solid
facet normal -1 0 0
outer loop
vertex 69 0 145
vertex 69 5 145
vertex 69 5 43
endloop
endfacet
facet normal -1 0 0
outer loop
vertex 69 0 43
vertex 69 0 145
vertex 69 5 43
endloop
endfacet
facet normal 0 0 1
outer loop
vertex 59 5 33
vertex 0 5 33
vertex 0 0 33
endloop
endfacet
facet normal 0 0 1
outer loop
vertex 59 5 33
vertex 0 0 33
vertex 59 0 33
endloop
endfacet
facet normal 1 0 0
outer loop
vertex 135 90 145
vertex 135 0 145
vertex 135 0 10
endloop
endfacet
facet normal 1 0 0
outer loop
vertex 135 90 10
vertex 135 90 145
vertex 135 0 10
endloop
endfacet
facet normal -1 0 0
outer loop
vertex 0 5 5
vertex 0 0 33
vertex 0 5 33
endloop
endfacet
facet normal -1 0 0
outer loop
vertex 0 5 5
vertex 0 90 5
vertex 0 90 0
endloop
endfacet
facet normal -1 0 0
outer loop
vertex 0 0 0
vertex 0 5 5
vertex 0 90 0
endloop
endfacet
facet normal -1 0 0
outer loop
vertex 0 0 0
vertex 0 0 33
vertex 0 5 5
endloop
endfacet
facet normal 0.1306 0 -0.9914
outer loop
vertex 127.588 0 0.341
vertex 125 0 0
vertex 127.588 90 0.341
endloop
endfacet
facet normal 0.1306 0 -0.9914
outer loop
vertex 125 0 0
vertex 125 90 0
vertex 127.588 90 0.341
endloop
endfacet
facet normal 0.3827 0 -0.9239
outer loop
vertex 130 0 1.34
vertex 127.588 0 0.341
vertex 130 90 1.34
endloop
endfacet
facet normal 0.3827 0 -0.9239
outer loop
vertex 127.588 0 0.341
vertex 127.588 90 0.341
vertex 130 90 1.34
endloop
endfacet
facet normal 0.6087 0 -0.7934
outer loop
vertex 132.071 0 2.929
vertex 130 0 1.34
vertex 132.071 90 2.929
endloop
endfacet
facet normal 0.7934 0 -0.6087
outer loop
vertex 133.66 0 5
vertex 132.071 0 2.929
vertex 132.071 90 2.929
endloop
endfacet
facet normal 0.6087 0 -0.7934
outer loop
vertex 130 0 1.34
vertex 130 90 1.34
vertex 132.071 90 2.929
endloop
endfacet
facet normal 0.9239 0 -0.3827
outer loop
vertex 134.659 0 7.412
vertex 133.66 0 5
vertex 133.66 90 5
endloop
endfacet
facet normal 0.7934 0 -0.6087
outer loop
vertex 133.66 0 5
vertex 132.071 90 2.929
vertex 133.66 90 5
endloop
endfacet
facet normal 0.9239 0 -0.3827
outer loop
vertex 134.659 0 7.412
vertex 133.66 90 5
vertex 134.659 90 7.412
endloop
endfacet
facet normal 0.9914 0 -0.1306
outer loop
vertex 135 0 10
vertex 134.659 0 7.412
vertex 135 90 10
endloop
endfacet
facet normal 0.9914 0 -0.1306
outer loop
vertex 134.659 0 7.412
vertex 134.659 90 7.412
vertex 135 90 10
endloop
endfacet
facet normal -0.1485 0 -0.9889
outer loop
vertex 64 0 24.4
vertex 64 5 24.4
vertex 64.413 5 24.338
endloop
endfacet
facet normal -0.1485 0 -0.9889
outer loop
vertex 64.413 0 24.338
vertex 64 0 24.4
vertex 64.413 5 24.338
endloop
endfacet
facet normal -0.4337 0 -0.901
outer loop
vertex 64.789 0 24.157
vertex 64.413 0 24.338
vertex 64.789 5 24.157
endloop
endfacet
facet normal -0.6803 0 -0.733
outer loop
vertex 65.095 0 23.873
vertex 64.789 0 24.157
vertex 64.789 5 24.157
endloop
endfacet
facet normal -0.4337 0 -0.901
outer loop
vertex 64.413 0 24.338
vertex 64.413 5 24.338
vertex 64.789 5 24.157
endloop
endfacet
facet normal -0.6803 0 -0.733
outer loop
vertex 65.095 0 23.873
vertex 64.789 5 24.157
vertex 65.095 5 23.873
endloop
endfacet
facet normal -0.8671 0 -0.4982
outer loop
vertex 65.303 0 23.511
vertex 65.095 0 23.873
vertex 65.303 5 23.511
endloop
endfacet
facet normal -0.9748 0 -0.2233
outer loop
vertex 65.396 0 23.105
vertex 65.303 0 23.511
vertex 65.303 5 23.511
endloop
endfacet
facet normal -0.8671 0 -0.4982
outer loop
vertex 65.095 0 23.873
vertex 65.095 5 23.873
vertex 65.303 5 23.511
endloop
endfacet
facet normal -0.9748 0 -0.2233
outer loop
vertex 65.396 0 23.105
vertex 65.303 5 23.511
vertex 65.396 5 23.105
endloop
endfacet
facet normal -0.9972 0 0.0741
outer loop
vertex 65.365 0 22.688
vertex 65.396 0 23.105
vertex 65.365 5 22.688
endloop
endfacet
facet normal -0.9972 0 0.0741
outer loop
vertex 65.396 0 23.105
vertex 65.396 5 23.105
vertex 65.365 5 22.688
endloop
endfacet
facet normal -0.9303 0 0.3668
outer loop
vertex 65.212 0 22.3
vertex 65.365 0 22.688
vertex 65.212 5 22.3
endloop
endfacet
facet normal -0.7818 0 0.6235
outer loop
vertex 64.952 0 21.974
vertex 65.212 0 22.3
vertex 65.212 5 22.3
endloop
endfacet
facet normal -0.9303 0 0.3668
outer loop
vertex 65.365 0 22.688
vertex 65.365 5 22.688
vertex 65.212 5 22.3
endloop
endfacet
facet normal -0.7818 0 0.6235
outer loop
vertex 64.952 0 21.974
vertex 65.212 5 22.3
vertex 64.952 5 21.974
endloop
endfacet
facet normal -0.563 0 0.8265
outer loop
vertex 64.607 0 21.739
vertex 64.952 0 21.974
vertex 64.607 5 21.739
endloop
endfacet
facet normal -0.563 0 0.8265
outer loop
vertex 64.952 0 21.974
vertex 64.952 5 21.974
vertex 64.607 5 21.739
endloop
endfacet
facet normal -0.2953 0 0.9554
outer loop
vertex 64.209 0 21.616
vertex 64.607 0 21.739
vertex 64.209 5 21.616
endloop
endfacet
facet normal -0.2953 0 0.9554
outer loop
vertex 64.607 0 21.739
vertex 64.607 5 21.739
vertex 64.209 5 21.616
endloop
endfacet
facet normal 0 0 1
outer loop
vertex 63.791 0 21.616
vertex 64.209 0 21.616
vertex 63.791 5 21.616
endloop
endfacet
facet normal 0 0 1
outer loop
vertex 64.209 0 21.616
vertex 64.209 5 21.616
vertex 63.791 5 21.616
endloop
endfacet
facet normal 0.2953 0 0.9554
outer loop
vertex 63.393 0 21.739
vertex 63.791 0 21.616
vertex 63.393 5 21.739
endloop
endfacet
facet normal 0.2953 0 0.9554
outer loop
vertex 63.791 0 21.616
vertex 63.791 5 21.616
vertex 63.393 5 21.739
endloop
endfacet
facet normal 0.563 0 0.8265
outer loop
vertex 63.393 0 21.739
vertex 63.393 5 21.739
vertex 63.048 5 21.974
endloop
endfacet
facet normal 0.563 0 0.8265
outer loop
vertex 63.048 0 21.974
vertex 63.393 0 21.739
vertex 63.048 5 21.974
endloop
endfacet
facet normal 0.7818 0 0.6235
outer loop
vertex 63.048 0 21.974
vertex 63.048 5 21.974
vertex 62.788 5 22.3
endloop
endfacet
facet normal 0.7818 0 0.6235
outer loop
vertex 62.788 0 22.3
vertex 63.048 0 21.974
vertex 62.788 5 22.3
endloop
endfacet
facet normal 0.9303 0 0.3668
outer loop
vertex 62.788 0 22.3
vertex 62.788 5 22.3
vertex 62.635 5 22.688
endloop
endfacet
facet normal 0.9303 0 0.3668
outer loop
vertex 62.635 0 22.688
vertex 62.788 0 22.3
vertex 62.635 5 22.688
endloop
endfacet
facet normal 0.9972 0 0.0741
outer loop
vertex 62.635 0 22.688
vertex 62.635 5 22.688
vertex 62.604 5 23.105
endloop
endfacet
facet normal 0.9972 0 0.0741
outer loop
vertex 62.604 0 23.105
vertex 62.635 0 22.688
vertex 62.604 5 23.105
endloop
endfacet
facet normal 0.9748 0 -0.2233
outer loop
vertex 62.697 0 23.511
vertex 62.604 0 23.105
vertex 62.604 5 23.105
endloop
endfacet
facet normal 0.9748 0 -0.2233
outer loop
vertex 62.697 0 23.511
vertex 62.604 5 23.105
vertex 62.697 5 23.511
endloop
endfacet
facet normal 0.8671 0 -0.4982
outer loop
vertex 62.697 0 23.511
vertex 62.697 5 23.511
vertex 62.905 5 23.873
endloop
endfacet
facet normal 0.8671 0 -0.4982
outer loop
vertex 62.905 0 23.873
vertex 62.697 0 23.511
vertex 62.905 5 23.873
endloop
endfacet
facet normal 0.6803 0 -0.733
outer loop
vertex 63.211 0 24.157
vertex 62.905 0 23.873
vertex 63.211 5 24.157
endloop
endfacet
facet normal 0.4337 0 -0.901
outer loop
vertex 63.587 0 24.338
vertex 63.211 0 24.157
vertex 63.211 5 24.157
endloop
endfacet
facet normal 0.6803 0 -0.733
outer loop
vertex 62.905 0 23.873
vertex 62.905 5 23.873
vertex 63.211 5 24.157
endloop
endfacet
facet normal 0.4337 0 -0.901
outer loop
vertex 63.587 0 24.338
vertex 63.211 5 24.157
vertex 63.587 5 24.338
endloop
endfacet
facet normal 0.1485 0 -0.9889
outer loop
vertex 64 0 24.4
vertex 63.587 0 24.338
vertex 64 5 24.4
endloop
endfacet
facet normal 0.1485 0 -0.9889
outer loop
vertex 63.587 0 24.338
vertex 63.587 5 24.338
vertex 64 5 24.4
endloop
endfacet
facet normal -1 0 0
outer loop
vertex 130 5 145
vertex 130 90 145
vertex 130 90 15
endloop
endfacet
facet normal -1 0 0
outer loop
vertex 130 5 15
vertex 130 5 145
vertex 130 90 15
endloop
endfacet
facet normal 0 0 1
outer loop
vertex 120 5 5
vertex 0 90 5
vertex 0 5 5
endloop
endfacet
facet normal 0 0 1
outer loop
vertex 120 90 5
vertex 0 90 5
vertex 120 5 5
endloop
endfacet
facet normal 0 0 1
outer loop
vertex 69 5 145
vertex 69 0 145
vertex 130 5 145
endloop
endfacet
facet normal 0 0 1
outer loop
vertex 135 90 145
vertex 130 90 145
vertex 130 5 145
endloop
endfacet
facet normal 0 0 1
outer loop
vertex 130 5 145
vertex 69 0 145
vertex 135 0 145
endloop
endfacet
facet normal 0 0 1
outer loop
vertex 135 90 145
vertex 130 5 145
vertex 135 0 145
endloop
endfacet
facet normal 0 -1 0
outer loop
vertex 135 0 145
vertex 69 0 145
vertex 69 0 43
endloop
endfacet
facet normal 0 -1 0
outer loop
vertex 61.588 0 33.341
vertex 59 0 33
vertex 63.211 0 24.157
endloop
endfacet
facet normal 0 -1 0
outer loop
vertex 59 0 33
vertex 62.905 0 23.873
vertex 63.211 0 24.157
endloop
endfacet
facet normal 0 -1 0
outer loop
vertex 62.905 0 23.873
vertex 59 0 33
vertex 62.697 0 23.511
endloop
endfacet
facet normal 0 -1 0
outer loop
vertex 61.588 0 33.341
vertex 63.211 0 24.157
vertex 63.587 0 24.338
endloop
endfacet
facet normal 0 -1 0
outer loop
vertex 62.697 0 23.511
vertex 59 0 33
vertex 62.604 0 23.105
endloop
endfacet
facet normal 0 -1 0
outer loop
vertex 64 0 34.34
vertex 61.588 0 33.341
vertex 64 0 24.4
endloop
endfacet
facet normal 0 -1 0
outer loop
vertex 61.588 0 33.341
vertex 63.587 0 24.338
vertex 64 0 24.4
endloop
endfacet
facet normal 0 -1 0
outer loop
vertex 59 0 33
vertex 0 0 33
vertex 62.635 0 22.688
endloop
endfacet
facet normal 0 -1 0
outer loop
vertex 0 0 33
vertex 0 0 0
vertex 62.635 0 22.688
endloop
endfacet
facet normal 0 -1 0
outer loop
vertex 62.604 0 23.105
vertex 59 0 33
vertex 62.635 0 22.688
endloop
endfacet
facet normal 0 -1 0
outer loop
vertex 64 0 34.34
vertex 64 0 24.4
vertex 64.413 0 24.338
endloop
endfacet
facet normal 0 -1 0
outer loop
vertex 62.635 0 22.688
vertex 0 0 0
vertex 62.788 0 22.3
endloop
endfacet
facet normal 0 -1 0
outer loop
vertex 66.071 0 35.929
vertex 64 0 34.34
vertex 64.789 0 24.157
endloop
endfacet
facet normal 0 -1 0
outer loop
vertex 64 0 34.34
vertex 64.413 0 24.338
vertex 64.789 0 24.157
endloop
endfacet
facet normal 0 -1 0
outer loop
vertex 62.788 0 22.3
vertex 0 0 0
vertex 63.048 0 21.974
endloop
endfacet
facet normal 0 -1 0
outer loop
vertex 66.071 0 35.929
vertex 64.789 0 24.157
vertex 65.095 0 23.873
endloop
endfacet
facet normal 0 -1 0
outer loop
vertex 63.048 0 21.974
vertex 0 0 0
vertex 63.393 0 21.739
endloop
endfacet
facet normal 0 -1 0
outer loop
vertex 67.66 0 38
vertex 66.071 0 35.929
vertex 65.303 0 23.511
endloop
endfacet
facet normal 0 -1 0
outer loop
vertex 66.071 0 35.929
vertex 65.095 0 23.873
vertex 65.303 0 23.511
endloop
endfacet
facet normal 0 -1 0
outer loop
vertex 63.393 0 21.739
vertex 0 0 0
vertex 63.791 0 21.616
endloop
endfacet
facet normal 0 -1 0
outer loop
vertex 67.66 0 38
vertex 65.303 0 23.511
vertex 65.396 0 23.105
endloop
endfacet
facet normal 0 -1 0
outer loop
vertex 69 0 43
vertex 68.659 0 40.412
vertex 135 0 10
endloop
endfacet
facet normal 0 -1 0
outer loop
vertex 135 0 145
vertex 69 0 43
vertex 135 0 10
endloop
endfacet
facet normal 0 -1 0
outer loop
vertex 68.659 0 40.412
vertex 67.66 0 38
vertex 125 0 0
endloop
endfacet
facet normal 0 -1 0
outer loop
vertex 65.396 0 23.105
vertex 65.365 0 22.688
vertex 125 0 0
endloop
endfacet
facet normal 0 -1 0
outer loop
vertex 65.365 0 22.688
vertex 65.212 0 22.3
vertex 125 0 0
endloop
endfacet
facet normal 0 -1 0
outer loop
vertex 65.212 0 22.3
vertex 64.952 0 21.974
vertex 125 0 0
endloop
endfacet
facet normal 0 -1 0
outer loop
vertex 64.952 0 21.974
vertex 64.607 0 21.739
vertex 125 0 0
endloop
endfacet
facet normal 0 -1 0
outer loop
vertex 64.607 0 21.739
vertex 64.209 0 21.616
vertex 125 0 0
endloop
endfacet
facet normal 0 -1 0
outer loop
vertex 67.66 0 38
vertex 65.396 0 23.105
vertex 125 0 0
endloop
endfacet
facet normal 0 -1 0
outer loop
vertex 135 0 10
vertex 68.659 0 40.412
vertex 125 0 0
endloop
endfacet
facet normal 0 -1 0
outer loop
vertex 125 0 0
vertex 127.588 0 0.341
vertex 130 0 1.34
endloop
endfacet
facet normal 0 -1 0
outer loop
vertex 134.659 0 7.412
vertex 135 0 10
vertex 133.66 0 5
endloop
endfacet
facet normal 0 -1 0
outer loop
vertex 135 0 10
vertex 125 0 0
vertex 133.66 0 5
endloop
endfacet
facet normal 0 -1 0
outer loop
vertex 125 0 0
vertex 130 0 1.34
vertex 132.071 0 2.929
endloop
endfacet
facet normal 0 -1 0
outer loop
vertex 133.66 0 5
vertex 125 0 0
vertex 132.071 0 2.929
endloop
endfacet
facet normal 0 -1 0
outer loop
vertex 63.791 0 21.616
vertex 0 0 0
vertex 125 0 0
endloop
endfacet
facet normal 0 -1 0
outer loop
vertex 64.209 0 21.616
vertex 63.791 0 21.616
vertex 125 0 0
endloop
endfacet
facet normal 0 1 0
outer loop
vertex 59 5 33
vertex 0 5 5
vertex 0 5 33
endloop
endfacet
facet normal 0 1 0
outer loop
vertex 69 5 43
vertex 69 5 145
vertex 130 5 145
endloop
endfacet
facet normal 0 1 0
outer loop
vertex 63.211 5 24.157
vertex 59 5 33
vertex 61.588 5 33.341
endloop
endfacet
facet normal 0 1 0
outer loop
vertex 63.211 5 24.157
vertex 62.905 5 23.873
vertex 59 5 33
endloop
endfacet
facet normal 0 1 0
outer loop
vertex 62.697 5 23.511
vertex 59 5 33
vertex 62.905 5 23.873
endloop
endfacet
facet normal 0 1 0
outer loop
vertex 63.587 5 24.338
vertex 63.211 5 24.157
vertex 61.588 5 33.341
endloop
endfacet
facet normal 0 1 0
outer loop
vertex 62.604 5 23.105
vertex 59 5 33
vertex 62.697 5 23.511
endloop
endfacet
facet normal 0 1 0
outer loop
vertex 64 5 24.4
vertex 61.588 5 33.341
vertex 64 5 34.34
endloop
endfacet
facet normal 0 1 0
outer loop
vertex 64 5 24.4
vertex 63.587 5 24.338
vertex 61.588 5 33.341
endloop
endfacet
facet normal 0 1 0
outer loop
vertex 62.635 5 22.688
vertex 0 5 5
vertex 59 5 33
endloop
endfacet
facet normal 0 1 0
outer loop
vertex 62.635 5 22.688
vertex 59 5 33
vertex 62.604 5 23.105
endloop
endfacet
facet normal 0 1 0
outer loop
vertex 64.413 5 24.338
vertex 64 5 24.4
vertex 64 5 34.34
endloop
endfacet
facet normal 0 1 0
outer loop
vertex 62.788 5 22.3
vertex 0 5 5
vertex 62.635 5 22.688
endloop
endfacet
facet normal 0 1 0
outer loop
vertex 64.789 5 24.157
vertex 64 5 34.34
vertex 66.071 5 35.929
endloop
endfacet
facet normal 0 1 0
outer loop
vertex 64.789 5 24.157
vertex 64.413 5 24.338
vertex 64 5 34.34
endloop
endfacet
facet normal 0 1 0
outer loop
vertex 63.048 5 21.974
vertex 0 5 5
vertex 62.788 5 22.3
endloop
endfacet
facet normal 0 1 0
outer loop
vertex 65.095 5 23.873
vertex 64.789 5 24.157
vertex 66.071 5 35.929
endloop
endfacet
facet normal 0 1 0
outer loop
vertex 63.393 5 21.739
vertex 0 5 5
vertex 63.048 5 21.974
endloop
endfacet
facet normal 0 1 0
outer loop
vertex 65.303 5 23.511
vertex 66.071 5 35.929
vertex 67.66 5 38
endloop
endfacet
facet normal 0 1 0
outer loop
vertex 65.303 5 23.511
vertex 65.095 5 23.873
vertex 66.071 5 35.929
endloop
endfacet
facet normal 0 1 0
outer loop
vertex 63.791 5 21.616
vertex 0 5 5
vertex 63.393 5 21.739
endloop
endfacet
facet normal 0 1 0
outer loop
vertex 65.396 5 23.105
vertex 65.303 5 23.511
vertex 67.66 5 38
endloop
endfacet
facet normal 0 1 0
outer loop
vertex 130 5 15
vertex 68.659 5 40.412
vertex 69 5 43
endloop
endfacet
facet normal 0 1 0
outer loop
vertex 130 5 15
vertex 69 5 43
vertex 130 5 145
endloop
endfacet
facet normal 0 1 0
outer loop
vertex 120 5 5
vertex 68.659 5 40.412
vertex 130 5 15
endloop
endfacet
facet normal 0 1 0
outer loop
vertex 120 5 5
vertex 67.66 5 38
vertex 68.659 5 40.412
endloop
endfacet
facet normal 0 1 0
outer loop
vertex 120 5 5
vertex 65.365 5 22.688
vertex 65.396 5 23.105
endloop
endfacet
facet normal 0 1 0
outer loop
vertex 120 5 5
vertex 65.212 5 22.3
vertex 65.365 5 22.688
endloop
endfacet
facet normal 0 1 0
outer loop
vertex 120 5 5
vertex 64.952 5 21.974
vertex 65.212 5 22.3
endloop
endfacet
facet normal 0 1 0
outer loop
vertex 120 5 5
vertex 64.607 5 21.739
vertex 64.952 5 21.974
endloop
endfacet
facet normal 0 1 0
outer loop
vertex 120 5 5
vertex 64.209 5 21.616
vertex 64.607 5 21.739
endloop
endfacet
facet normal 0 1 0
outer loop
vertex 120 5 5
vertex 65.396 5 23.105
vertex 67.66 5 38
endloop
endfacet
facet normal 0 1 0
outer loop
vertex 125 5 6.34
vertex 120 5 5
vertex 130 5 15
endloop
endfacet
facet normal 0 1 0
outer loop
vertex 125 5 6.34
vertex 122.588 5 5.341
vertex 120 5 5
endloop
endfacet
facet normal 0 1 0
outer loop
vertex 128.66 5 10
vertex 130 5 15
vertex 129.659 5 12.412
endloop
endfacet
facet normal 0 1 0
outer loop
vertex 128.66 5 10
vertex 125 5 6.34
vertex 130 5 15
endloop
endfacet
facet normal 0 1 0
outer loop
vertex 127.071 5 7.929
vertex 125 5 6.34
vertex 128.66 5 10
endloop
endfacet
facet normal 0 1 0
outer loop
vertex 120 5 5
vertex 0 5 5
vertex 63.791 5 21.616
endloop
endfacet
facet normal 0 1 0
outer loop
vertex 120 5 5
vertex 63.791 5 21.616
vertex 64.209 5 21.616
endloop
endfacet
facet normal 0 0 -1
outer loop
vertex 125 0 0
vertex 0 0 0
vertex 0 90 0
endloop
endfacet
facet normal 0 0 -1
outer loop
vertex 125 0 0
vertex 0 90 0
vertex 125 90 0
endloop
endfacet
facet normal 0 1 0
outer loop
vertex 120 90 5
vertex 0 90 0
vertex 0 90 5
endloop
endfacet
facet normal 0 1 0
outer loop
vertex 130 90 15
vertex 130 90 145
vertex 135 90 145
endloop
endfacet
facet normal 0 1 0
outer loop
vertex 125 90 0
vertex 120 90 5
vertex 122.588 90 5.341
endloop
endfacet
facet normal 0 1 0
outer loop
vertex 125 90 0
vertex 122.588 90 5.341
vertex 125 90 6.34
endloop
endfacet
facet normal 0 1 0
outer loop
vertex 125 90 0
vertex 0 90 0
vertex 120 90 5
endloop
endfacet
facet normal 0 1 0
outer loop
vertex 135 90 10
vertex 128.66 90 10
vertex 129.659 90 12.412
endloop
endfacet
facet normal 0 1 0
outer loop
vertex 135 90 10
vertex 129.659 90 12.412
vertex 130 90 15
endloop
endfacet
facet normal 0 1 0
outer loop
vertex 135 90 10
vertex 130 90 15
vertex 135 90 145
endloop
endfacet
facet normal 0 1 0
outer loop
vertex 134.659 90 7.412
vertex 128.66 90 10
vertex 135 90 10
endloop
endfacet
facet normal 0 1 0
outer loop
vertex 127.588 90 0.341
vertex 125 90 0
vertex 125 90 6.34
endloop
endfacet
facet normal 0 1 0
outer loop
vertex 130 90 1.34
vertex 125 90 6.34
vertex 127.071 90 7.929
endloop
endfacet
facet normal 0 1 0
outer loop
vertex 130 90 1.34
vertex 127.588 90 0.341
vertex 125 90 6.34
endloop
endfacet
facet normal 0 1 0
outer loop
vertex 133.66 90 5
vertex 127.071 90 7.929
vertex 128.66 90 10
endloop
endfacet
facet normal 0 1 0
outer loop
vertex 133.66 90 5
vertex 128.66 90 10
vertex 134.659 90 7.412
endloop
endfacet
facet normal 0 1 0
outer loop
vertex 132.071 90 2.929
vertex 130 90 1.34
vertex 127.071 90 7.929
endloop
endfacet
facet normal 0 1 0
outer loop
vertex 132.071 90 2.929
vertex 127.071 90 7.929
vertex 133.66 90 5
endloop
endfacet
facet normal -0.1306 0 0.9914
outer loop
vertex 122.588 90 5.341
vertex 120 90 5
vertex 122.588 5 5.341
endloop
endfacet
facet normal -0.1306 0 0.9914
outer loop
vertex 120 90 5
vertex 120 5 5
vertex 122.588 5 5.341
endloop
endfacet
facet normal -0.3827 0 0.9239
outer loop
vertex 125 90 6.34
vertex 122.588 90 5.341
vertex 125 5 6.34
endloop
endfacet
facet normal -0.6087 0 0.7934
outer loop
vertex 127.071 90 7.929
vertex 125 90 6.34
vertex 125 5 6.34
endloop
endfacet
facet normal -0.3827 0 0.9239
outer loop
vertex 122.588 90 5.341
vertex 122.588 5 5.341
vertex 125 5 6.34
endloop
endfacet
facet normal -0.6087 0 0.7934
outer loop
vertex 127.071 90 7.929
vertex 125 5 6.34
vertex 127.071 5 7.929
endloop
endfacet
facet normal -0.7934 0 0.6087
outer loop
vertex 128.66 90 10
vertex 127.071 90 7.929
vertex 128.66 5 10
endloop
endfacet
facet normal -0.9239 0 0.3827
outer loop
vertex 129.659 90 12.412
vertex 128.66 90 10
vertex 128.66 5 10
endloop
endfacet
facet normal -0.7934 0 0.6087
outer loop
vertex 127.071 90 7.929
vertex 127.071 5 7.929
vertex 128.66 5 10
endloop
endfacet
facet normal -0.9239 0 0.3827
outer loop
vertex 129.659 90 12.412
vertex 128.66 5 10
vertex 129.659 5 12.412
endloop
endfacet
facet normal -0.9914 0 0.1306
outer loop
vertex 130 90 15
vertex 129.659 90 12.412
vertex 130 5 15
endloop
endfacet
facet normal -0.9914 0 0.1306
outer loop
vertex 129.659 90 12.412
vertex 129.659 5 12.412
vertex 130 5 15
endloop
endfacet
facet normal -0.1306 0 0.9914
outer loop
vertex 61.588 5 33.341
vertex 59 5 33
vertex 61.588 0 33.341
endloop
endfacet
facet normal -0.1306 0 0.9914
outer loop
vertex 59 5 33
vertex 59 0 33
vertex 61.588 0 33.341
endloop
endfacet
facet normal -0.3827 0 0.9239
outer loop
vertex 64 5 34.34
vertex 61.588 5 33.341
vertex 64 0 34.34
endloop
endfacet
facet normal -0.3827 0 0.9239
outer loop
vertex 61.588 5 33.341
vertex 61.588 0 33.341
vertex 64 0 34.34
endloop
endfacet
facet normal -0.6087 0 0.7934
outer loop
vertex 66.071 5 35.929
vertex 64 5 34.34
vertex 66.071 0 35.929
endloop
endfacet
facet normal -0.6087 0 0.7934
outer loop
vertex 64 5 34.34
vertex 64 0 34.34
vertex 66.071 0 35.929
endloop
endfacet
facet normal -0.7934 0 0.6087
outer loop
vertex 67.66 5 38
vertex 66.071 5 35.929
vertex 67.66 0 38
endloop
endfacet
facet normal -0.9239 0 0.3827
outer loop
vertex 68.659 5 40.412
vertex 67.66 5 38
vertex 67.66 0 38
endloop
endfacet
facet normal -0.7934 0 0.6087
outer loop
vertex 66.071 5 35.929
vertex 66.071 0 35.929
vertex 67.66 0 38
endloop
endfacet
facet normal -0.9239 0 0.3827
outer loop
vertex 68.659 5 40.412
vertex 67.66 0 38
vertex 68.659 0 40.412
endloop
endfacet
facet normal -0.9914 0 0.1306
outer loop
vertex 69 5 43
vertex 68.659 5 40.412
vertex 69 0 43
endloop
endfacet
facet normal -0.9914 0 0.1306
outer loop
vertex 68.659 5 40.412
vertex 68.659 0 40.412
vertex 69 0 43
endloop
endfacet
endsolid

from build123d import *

# Parameters (mm, degrees)
SKETCH_1_W          = 135
SKETCH_1_H          = 145
EXTRUDE_1_DEPTH     = 90
SKETCH_2_W          = 130
SKETCH_2_H          = 140
CUT_EXTRUDE_1_DEPTH = 85
SKETCH_3_W          = 69
SKETCH_3_H          = 112
CUT_EXTRUDE_2_DEPTH = 5
SKETCH_4_R          = 1.4
CUT_EXTRUDE_3_DEPTH = 5
FILLET_1_R          = 10


with BuildPart() as part:
    # 草图1 → 凸台-拉伸1 (new body)
    with BuildSketch(Plane(origin=(0, 0, 0), x_dir=(1, 0, 0), z_dir=(0, 1, 0))):
        with Locations((67.5, -72.5)):
            Rectangle(SKETCH_1_W, SKETCH_1_H)
    extrude(amount=EXTRUDE_1_DEPTH)

    # 草图2 → 切除-拉伸1 (cut)
    with BuildSketch(Plane(origin=(0, 90, 0), x_dir=(1, 0, 0), z_dir=(0, 1, 0))):
        with Locations((65, -75)):
            Rectangle(SKETCH_2_W, SKETCH_2_H)
    extrude(amount=-CUT_EXTRUDE_1_DEPTH, mode=Mode.SUBTRACT)

    # 草图3 → 切除-拉伸2 (cut)
    with BuildSketch(Plane(origin=(0, 5, 0), x_dir=(1, 0, 0), z_dir=(0, 1, 0))):
        with Locations((34.5, -89)):
            Rectangle(SKETCH_3_W, SKETCH_3_H)
    extrude(amount=-CUT_EXTRUDE_2_DEPTH, mode=Mode.SUBTRACT)

    # 草图4 → 切除-拉伸3 (cut)
    with BuildSketch(Plane(origin=(0, 5, 0), x_dir=(1, 0, 0), z_dir=(0, 1, 0))):
        with Locations(Location((64, -23, 0), (0, 0, 270))):
            Circle(SKETCH_4_R)
    extrude(amount=-CUT_EXTRUDE_3_DEPTH, mode=Mode.SUBTRACT)

    # 圆角1
    fillet_1_edges = [part.edges().sort_by_distance(p)[0] for p in [
        (130, 47.5, 5),
        (69, 2.5, 33),
        (135, 45, 0),
    ]]
    fillet(fillet_1_edges, radius=FILLET_1_R)


solid = part.part
